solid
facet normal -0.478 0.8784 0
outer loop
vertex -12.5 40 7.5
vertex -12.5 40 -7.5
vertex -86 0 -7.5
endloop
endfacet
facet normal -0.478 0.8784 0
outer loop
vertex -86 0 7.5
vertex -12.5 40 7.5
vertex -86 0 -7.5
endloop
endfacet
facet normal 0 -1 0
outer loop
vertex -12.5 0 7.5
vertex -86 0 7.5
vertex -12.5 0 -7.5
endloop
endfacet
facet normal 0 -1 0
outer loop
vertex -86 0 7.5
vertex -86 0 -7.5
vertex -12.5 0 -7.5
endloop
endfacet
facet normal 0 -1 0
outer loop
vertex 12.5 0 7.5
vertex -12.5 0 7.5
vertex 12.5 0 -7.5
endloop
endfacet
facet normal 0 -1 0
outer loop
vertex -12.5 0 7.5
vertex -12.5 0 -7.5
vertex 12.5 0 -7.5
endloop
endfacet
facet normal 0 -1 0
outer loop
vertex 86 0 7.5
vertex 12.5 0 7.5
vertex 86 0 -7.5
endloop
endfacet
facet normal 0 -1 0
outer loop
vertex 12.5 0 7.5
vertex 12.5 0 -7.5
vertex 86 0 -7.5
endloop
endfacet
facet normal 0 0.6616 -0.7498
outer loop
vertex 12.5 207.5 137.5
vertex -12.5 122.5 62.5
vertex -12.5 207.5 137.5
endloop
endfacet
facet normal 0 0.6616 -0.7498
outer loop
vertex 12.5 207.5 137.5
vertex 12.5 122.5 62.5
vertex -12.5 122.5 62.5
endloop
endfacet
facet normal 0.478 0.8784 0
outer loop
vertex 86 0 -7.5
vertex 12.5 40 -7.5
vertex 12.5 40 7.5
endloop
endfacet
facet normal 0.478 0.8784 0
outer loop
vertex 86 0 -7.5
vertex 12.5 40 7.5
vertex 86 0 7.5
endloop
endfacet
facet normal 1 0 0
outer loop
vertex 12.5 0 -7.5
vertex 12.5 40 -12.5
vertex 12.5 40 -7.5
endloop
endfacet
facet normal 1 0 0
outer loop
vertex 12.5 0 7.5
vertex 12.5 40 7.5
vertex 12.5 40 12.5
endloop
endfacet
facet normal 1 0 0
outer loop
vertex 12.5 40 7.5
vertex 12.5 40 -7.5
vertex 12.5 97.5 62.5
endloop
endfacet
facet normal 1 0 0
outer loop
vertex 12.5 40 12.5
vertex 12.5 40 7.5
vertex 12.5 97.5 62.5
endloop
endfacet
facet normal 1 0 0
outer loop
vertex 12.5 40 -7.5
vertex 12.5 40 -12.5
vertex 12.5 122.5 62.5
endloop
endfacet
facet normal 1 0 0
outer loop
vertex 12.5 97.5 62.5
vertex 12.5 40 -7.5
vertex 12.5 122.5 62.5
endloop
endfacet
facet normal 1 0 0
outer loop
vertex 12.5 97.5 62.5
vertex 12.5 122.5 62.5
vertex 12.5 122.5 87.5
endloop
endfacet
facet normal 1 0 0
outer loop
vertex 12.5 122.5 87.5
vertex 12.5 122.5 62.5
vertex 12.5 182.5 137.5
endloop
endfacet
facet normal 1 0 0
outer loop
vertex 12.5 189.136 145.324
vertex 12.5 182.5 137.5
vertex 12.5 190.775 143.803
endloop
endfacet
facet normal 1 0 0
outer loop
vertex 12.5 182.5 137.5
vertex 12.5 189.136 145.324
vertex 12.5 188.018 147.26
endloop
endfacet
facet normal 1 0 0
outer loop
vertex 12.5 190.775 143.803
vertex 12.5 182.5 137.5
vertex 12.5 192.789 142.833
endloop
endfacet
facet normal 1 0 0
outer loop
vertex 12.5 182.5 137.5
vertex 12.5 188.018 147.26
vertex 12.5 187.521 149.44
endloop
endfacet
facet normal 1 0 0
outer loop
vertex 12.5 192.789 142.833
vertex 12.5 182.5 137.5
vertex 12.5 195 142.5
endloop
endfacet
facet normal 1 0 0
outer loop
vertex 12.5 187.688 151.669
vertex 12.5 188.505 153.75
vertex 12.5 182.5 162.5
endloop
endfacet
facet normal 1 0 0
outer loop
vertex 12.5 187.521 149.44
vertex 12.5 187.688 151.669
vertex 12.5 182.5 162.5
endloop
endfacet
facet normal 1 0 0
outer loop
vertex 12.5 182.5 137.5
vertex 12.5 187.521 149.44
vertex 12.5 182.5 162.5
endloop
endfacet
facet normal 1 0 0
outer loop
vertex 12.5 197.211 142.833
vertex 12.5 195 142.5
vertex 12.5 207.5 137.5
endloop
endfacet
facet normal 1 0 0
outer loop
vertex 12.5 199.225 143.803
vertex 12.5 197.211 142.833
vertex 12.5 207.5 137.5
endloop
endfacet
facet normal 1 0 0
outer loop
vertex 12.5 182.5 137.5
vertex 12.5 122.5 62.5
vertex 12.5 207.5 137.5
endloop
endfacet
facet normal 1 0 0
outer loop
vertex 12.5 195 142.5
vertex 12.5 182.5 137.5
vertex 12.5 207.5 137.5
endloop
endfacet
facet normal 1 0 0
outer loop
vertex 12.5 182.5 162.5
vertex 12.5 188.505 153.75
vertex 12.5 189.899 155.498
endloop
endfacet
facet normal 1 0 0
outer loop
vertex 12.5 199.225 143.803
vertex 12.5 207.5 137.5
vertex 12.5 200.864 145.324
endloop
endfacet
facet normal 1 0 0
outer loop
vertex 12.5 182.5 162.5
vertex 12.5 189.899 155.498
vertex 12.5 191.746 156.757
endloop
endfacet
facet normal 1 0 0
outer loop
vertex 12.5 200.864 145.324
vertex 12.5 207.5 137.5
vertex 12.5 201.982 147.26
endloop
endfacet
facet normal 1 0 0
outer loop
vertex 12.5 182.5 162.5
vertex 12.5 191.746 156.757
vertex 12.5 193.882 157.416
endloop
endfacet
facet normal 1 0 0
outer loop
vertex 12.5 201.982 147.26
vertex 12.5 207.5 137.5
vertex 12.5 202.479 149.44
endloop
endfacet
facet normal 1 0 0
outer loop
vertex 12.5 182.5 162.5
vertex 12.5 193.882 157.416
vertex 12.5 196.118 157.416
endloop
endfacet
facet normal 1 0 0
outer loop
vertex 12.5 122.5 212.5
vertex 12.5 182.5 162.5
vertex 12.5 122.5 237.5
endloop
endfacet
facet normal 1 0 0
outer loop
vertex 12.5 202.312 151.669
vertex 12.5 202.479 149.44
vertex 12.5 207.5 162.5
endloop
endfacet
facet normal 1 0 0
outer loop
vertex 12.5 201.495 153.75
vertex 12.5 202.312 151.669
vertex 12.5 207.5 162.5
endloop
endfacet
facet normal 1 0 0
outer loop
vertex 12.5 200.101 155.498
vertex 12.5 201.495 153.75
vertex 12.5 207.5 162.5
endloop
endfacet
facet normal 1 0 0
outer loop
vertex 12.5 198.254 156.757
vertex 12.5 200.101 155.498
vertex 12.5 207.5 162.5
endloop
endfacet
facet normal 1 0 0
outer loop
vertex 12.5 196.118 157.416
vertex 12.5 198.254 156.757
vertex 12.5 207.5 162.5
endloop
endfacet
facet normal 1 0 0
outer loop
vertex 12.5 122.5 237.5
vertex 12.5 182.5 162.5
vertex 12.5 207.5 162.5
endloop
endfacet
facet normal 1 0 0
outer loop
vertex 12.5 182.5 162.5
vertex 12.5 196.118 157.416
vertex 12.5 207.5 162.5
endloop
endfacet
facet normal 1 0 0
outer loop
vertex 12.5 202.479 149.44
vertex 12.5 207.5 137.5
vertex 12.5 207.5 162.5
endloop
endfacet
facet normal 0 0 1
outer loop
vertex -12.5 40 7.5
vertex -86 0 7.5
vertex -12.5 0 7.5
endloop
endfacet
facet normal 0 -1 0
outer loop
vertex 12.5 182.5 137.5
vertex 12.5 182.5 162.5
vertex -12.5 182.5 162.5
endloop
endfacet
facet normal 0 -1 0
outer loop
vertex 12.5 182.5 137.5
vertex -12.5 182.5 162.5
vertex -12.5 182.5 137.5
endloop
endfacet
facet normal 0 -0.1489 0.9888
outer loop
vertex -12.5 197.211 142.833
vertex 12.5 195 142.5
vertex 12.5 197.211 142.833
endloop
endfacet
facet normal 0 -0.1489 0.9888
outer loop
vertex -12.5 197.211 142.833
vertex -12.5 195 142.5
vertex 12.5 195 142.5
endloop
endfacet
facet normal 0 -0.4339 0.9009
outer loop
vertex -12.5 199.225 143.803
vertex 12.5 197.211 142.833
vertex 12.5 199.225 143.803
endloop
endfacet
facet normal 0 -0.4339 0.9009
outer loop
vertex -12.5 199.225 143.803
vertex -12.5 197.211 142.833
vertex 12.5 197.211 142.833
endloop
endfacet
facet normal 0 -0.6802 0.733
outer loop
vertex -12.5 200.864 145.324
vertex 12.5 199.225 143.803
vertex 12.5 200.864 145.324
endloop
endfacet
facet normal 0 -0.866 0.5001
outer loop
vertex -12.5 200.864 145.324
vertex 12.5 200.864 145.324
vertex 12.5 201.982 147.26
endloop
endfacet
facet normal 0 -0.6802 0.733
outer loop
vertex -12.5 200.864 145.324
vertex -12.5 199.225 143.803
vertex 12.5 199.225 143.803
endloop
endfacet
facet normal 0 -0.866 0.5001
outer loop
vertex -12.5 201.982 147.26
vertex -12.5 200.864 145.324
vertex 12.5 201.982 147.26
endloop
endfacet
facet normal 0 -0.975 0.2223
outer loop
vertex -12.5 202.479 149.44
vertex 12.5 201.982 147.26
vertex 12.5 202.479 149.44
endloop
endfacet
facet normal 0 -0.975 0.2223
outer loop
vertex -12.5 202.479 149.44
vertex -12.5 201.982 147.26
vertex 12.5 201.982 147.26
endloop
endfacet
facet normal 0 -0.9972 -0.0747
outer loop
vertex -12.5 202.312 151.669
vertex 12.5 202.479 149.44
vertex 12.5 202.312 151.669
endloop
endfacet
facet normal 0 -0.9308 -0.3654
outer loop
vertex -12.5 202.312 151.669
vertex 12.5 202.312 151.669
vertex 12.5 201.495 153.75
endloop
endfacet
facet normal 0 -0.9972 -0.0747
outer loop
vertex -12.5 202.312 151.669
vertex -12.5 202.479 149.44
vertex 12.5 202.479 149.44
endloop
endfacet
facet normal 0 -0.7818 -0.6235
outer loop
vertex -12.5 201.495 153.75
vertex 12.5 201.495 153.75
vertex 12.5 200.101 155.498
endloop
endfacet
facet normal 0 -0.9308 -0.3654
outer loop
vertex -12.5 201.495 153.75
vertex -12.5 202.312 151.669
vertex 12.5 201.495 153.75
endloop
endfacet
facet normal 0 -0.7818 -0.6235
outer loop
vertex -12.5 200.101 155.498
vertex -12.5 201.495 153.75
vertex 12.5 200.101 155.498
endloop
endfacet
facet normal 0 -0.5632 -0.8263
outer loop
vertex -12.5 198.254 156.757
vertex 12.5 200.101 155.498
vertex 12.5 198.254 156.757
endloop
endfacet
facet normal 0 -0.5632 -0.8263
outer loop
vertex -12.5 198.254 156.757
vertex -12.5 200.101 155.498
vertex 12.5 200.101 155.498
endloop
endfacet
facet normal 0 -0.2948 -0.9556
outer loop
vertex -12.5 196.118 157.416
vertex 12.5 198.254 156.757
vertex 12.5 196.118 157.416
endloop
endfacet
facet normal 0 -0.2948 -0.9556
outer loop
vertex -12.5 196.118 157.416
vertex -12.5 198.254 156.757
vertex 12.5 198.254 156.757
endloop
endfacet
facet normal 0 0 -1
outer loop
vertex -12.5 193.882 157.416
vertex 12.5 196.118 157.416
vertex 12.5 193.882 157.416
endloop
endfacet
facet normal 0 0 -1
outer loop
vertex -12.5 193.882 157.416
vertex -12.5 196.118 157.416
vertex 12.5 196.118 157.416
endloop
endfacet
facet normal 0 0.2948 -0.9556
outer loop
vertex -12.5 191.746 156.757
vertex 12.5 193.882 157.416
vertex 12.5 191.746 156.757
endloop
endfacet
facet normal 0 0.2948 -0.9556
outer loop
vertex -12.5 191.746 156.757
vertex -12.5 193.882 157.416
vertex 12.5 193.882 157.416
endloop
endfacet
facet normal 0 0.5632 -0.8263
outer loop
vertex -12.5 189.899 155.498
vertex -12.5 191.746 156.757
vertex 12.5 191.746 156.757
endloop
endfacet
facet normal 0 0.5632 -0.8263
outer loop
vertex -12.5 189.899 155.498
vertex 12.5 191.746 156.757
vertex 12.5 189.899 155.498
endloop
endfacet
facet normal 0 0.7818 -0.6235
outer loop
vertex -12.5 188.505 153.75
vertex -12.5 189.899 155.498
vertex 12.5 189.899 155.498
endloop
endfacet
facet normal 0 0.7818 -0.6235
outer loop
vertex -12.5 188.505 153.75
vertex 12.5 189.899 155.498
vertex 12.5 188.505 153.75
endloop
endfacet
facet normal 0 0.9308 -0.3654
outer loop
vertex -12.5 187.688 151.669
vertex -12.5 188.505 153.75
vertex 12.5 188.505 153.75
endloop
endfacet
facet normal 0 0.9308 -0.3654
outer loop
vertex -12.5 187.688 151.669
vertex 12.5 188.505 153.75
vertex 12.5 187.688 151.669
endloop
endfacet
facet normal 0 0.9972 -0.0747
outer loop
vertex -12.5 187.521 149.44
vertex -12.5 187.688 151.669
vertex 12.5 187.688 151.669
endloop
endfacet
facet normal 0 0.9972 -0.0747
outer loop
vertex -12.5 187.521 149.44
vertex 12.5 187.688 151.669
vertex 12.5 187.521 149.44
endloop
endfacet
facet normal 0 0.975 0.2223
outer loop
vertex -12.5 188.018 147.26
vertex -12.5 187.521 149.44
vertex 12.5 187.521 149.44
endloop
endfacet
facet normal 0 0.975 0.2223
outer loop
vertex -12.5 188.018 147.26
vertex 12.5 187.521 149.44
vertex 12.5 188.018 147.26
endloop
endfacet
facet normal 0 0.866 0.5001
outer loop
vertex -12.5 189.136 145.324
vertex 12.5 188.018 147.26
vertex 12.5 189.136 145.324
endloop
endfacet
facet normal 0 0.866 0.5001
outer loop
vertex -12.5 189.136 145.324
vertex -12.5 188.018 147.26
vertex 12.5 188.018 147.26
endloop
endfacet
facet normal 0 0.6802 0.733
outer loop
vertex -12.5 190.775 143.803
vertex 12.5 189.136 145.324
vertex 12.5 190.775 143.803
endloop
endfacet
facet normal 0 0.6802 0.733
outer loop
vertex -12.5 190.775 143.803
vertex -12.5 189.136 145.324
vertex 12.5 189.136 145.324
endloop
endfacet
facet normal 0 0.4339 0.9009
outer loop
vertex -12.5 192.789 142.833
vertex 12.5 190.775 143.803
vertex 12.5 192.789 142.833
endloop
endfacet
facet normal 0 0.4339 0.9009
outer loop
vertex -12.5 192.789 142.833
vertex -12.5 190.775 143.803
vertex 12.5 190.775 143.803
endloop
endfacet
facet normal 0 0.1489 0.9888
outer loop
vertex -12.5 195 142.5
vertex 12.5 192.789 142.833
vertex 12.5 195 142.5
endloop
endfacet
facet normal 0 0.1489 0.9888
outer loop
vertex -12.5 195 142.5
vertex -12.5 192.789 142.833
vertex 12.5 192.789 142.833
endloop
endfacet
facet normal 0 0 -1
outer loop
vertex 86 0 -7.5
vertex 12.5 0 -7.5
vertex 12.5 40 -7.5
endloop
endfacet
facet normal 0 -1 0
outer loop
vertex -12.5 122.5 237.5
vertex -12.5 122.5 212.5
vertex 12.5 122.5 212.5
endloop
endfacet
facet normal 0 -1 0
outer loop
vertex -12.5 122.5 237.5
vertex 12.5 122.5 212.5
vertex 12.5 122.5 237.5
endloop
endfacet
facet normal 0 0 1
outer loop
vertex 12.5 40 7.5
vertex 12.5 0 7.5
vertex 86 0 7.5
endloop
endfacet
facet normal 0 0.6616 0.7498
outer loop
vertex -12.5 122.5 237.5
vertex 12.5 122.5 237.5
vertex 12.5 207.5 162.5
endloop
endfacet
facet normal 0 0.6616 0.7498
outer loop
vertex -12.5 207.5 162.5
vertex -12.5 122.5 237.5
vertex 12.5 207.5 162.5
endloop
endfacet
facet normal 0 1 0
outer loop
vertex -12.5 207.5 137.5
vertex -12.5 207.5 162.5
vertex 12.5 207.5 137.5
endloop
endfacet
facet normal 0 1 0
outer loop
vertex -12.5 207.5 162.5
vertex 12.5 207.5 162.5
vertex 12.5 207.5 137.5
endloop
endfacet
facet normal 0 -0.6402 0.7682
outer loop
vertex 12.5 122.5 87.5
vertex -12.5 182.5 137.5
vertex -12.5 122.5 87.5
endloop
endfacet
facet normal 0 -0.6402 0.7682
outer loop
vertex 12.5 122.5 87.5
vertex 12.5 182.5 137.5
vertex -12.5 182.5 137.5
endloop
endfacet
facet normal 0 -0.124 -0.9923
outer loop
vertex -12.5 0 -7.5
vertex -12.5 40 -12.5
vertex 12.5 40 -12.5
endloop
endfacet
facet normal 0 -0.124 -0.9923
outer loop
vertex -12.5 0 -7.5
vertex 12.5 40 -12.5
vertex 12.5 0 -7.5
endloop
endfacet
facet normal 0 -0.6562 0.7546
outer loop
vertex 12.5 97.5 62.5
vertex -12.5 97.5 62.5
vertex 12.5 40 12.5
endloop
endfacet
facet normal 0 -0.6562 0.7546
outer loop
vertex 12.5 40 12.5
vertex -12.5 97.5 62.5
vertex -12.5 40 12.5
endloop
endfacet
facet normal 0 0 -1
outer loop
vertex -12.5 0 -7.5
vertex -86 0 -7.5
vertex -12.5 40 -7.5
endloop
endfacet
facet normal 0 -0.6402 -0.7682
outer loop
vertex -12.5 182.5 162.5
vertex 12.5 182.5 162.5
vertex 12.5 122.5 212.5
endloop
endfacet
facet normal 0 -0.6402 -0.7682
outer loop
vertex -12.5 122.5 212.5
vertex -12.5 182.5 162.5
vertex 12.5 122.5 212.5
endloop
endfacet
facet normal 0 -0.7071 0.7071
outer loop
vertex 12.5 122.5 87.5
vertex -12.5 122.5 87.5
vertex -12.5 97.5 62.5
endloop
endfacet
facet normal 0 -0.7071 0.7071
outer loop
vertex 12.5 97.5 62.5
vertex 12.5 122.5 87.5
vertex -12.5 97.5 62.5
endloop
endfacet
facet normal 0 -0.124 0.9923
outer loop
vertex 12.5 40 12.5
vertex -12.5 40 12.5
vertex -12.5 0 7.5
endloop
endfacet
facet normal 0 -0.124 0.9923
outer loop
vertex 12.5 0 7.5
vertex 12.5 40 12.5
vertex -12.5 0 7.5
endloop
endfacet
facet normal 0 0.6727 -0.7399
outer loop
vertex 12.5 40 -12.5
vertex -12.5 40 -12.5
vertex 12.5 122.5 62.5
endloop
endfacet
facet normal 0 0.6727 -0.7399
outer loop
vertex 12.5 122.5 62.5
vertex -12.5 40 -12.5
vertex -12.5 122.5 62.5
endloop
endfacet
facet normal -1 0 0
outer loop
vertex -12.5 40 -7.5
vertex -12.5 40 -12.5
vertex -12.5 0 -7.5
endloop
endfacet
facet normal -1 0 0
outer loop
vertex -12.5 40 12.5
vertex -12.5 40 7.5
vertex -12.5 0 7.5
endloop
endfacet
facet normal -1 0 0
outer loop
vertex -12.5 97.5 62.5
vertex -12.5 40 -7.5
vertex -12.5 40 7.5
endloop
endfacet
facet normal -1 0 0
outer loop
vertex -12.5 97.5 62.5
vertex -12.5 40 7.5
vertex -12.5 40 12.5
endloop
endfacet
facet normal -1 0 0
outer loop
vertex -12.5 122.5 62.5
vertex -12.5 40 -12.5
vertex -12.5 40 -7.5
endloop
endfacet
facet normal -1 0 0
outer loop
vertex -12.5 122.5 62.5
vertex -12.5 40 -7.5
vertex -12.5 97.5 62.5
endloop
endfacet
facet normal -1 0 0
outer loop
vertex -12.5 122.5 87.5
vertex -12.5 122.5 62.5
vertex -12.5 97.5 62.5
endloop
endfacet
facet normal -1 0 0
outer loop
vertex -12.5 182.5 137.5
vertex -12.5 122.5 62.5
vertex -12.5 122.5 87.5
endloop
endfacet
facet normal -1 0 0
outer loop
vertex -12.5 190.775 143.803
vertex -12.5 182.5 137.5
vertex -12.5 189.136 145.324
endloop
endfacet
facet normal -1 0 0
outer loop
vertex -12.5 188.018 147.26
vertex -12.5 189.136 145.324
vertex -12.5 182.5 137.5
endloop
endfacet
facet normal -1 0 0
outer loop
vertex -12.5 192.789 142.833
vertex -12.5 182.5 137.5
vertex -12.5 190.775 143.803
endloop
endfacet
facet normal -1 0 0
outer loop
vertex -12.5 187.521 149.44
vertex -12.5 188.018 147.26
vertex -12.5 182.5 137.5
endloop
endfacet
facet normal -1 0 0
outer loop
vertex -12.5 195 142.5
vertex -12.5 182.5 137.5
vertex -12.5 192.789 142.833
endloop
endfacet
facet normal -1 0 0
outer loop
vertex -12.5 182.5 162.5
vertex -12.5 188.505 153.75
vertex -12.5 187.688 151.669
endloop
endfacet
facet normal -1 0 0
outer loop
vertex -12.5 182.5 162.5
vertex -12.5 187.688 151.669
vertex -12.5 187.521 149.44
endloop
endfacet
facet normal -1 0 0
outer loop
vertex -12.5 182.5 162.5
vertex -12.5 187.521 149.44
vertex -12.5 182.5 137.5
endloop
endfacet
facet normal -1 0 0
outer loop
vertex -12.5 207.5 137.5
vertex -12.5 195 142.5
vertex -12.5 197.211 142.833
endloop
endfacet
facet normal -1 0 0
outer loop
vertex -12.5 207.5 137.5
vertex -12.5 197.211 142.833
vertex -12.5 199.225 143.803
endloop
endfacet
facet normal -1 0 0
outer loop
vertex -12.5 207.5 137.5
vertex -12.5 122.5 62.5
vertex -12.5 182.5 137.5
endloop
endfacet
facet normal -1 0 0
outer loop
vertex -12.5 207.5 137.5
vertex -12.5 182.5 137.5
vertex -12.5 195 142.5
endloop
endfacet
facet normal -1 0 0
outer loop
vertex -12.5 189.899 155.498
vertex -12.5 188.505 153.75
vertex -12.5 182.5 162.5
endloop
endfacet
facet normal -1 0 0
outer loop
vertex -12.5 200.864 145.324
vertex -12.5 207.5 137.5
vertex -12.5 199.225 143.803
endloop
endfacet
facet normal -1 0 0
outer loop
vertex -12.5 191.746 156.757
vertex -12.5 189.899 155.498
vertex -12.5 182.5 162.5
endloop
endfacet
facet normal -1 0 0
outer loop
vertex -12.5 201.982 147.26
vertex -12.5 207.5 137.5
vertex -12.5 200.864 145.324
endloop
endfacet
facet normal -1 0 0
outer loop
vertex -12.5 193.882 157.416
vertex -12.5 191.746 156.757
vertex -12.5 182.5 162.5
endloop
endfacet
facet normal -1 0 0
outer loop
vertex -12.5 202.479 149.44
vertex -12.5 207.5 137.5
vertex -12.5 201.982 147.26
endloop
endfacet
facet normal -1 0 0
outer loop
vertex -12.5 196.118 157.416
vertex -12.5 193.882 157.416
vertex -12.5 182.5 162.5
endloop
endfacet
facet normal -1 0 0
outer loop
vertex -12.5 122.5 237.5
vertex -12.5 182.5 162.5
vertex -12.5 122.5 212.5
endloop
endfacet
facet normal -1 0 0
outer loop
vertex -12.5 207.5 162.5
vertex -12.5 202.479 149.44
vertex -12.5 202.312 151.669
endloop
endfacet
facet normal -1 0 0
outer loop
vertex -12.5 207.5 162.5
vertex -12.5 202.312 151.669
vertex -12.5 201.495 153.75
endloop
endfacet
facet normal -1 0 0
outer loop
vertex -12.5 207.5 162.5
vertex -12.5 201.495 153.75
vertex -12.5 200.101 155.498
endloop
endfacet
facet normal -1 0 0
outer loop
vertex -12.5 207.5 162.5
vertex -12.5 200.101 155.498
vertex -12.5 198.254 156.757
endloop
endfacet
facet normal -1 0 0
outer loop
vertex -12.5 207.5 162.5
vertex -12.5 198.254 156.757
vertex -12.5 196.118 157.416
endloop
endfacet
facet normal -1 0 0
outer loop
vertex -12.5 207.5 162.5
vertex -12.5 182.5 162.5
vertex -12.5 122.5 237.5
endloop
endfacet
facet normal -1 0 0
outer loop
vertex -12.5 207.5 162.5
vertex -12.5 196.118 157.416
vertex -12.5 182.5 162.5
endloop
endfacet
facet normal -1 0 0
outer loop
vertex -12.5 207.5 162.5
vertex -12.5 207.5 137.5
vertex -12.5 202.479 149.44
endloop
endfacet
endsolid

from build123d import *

# Parameters (mm, degrees)
SKETCH2_W                  = 25
SKETCH2_H                  = 5
SKETCH2_H_2                = 15
SKETCH2_W_2                = 73.5
BOSS_EXTRUDE3_DEPTH        = 40
CUT_EXTRUDE1_DEPTH         = 15
CUT_EXTRUDE3_DEPTH         = 25
SKETCH5_W                  = 25
SKETCH5_H                  = 25
BOSS_EXTRUDE4_DEPTH        = 12.5
BOSS_EXTRUDE4_DEPTH_BACK   = 12.5
BOSS_EXTRUDE4_2_DEPTH      = 12.5
BOSS_EXTRUDE4_2_DEPTH_BACK = 12.5
BOSS_EXTRUDE5_START        = -12.5
BOSS_EXTRUDE5_DEPTH        = 25
SKETCH9_W                  = 25
SKETCH9_H                  = 25
SKETCH9_R                  = 7.5
BOSS_EXTRUDE6_DEPTH        = 12.5
BOSS_EXTRUDE6_DEPTH_BACK   = 12.5
BOSS_EXTRUDE7_DEPTH        = 12.5
BOSS_EXTRUDE7_DEPTH_BACK   = 12.5
BOSS_EXTRUDE8_DEPTH        = 12.5
BOSS_EXTRUDE8_DEPTH_BACK   = 12.5
CUT_EXTRUDE4_REACH         = 100.5
SKETCH12_W                 = 25
SKETCH12_H                 = 25
CUT_EXTRUDE5_REACH         = 100.5


with BuildPart() as part:
    # Sketch2 → Boss-Extrude3 (new body)
    with BuildSketch(Plane(origin=(0, 0, 0), x_dir=(1, 0, 0), z_dir=(0, 1, 0))):
        with Locations((0, -10)):
            Rectangle(SKETCH2_W, SKETCH2_H)
        Rectangle(SKETCH2_W, SKETCH2_H_2)
        with Locations((0, 10)):
            Rectangle(SKETCH2_W, SKETCH2_H)
        with Locations((-49.25, 0)):
            Rectangle(SKETCH2_W_2, SKETCH2_H_2)
        with Locations((49.25, 0)):
            Rectangle(SKETCH2_W_2, SKETCH2_H_2)
    extrude(amount=BOSS_EXTRUDE3_DEPTH)

    # Sketch6 → Cut-Extrude1 (cut)
    with BuildSketch(Plane(origin=(0, 0, -7.5), x_dir=(-1, 0, 0), z_dir=(0, 0, -1))):
        Polygon((12.5, 40), (86, 0), (86, 40), align=None)
    cut_extrude1 = extrude(amount=-CUT_EXTRUDE1_DEPTH, mode=Mode.SUBTRACT)

    # Mirror1: Cut-Extrude1 across plane
    add(cut_extrude1.mirror(Plane(origin=(0, 0, 0), x_dir=(0, 0, 1), z_dir=(1, 0, 0))), mode=Mode.SUBTRACT)

    # Sketch7 → Cut-Extrude3 (cut)
    with BuildSketch(Plane.ZY.offset(12.5)):
        Polygon((-12.5, 40), (-7.5, 0), (-12.5, 0), align=None)
    cut_extrude3 = extrude(amount=-CUT_EXTRUDE3_DEPTH, mode=Mode.SUBTRACT)

    # Mirror2: Cut-Extrude3 across plane
    add(cut_extrude3.mirror(Plane.XY), mode=Mode.SUBTRACT)



with BuildPart() as body_2:
    # Sketch5 → Boss-Extrude4 (new body, two sides)
    with BuildSketch(Plane(origin=(0, 0, 0), x_dir=(0, 0, -1), z_dir=(1, 0, 0))) as boss_extrude4_sk:
        with Locations((-75, 110)):
            Rectangle(SKETCH5_W, SKETCH5_H)
    extrude(amount=BOSS_EXTRUDE4_DEPTH)
    extrude(boss_extrude4_sk.sketch, amount=-BOSS_EXTRUDE4_DEPTH_BACK)


with BuildPart() as body_3:
    # Sketch5 → Boss-Extrude4 2 (new body, two sides)
    with BuildSketch(Plane(origin=(0, 0, 0), x_dir=(0, 0, -1), z_dir=(1, 0, 0))) as boss_extrude4_2_sk:
        with Locations((-225, 110)):
            Rectangle(SKETCH5_W, SKETCH5_H)
    extrude(amount=BOSS_EXTRUDE4_2_DEPTH)
    extrude(boss_extrude4_2_sk.sketch, amount=-BOSS_EXTRUDE4_2_DEPTH_BACK)


with BuildPart() as part_1:
    add(part.part)

    add(body_2.part)  # Boss-Extrude5 merges body 2
    # Sketch8 → Boss-Extrude5 (add)
    with BuildSketch(Plane(origin=(0, 0, 0), x_dir=(0, 0, -1), z_dir=(1, 0, 0)).offset(BOSS_EXTRUDE5_START)):
        Polygon((-62.5, 97.5), (-12.5, 40), (12.5, 40), (-62.5, 122.5), align=None)
    extrude(amount=BOSS_EXTRUDE5_DEPTH)



with BuildPart() as body_3_2:
    # Sketch9 → Boss-Extrude6 (new body, two sides)
    with BuildSketch(Plane(origin=(0, 0, 0), x_dir=(0, 0, -1), z_dir=(1, 0, 0))) as boss_extrude6_sk:
        with Locations((-150, 195)):
            Rectangle(SKETCH9_W, SKETCH9_H)
        with Locations((-150, 195)):
            Circle(SKETCH9_R, mode=Mode.SUBTRACT)
    extrude(amount=BOSS_EXTRUDE6_DEPTH)
    extrude(boss_extrude6_sk.sketch, amount=-BOSS_EXTRUDE6_DEPTH_BACK)


with BuildPart() as part_2:
    add(part_1.part)

    add(body_3_2.part)  # Boss-Extrude7 merges body 3 2
    # Sketch10 → Boss-Extrude7 (add, two sides)
    with BuildSketch(Plane(origin=(0, 0, 0), x_dir=(0, 0, -1), z_dir=(1, 0, 0))) as boss_extrude7_sk:
        Polygon((-137.5, 182.5), (-87.5, 122.5), (-62.5, 122.5), (-137.5, 207.5), align=None)
    extrude(amount=BOSS_EXTRUDE7_DEPTH)
    extrude(boss_extrude7_sk.sketch, amount=-BOSS_EXTRUDE7_DEPTH_BACK)


    add(body_3.part)  # Boss-Extrude8 merges body 3
    # Sketch11 → Boss-Extrude8 (add, two sides)
    with BuildSketch(Plane(origin=(0, 0, 0), x_dir=(0, 0, -1), z_dir=(1, 0, 0))) as boss_extrude8_sk:
        Polygon((-162.5, 182.5), (-212.5, 122.5), (-237.5, 122.5), (-162.5, 207.5), align=None)
    extrude(amount=BOSS_EXTRUDE8_DEPTH)
    extrude(boss_extrude8_sk.sketch, amount=-BOSS_EXTRUDE8_DEPTH_BACK)

    # Sketch12 → Cut-Extrude4 (cut, up to next)
    with BuildSketch(Plane.ZY.offset(12.5), mode=Mode.PRIVATE) as cut_extrude4_sk1:
        with Locations((225, 110)):
            Rectangle(SKETCH12_W, SKETCH12_H)
    cut_extrude4_tool1 = extrude(cut_extrude4_sk1.sketch, amount=-CUT_EXTRUDE4_REACH, mode=Mode.PRIVATE) & part_2.part
    add(cut_extrude4_tool1.solids().sort_by_distance((-12.5, 110, 225))[0], mode=Mode.SUBTRACT)

    # Sketch13 → Cut-Extrude5 (cut, up to next)
    with BuildSketch(Plane.ZY.offset(12.5), mode=Mode.PRIVATE) as cut_extrude5_sk1:
        Polygon((87.5, 122.5), (62.5, 97.5), (87.5, 97.5), align=None)
    cut_extrude5_tool1 = extrude(cut_extrude5_sk1.sketch, amount=-CUT_EXTRUDE5_REACH, mode=Mode.PRIVATE) & part_2.part
    add(cut_extrude5_tool1.solids().sort_by_distance((-12.5, 105.833333, 79.166667))[0], mode=Mode.SUBTRACT)


solid = part_2.part
